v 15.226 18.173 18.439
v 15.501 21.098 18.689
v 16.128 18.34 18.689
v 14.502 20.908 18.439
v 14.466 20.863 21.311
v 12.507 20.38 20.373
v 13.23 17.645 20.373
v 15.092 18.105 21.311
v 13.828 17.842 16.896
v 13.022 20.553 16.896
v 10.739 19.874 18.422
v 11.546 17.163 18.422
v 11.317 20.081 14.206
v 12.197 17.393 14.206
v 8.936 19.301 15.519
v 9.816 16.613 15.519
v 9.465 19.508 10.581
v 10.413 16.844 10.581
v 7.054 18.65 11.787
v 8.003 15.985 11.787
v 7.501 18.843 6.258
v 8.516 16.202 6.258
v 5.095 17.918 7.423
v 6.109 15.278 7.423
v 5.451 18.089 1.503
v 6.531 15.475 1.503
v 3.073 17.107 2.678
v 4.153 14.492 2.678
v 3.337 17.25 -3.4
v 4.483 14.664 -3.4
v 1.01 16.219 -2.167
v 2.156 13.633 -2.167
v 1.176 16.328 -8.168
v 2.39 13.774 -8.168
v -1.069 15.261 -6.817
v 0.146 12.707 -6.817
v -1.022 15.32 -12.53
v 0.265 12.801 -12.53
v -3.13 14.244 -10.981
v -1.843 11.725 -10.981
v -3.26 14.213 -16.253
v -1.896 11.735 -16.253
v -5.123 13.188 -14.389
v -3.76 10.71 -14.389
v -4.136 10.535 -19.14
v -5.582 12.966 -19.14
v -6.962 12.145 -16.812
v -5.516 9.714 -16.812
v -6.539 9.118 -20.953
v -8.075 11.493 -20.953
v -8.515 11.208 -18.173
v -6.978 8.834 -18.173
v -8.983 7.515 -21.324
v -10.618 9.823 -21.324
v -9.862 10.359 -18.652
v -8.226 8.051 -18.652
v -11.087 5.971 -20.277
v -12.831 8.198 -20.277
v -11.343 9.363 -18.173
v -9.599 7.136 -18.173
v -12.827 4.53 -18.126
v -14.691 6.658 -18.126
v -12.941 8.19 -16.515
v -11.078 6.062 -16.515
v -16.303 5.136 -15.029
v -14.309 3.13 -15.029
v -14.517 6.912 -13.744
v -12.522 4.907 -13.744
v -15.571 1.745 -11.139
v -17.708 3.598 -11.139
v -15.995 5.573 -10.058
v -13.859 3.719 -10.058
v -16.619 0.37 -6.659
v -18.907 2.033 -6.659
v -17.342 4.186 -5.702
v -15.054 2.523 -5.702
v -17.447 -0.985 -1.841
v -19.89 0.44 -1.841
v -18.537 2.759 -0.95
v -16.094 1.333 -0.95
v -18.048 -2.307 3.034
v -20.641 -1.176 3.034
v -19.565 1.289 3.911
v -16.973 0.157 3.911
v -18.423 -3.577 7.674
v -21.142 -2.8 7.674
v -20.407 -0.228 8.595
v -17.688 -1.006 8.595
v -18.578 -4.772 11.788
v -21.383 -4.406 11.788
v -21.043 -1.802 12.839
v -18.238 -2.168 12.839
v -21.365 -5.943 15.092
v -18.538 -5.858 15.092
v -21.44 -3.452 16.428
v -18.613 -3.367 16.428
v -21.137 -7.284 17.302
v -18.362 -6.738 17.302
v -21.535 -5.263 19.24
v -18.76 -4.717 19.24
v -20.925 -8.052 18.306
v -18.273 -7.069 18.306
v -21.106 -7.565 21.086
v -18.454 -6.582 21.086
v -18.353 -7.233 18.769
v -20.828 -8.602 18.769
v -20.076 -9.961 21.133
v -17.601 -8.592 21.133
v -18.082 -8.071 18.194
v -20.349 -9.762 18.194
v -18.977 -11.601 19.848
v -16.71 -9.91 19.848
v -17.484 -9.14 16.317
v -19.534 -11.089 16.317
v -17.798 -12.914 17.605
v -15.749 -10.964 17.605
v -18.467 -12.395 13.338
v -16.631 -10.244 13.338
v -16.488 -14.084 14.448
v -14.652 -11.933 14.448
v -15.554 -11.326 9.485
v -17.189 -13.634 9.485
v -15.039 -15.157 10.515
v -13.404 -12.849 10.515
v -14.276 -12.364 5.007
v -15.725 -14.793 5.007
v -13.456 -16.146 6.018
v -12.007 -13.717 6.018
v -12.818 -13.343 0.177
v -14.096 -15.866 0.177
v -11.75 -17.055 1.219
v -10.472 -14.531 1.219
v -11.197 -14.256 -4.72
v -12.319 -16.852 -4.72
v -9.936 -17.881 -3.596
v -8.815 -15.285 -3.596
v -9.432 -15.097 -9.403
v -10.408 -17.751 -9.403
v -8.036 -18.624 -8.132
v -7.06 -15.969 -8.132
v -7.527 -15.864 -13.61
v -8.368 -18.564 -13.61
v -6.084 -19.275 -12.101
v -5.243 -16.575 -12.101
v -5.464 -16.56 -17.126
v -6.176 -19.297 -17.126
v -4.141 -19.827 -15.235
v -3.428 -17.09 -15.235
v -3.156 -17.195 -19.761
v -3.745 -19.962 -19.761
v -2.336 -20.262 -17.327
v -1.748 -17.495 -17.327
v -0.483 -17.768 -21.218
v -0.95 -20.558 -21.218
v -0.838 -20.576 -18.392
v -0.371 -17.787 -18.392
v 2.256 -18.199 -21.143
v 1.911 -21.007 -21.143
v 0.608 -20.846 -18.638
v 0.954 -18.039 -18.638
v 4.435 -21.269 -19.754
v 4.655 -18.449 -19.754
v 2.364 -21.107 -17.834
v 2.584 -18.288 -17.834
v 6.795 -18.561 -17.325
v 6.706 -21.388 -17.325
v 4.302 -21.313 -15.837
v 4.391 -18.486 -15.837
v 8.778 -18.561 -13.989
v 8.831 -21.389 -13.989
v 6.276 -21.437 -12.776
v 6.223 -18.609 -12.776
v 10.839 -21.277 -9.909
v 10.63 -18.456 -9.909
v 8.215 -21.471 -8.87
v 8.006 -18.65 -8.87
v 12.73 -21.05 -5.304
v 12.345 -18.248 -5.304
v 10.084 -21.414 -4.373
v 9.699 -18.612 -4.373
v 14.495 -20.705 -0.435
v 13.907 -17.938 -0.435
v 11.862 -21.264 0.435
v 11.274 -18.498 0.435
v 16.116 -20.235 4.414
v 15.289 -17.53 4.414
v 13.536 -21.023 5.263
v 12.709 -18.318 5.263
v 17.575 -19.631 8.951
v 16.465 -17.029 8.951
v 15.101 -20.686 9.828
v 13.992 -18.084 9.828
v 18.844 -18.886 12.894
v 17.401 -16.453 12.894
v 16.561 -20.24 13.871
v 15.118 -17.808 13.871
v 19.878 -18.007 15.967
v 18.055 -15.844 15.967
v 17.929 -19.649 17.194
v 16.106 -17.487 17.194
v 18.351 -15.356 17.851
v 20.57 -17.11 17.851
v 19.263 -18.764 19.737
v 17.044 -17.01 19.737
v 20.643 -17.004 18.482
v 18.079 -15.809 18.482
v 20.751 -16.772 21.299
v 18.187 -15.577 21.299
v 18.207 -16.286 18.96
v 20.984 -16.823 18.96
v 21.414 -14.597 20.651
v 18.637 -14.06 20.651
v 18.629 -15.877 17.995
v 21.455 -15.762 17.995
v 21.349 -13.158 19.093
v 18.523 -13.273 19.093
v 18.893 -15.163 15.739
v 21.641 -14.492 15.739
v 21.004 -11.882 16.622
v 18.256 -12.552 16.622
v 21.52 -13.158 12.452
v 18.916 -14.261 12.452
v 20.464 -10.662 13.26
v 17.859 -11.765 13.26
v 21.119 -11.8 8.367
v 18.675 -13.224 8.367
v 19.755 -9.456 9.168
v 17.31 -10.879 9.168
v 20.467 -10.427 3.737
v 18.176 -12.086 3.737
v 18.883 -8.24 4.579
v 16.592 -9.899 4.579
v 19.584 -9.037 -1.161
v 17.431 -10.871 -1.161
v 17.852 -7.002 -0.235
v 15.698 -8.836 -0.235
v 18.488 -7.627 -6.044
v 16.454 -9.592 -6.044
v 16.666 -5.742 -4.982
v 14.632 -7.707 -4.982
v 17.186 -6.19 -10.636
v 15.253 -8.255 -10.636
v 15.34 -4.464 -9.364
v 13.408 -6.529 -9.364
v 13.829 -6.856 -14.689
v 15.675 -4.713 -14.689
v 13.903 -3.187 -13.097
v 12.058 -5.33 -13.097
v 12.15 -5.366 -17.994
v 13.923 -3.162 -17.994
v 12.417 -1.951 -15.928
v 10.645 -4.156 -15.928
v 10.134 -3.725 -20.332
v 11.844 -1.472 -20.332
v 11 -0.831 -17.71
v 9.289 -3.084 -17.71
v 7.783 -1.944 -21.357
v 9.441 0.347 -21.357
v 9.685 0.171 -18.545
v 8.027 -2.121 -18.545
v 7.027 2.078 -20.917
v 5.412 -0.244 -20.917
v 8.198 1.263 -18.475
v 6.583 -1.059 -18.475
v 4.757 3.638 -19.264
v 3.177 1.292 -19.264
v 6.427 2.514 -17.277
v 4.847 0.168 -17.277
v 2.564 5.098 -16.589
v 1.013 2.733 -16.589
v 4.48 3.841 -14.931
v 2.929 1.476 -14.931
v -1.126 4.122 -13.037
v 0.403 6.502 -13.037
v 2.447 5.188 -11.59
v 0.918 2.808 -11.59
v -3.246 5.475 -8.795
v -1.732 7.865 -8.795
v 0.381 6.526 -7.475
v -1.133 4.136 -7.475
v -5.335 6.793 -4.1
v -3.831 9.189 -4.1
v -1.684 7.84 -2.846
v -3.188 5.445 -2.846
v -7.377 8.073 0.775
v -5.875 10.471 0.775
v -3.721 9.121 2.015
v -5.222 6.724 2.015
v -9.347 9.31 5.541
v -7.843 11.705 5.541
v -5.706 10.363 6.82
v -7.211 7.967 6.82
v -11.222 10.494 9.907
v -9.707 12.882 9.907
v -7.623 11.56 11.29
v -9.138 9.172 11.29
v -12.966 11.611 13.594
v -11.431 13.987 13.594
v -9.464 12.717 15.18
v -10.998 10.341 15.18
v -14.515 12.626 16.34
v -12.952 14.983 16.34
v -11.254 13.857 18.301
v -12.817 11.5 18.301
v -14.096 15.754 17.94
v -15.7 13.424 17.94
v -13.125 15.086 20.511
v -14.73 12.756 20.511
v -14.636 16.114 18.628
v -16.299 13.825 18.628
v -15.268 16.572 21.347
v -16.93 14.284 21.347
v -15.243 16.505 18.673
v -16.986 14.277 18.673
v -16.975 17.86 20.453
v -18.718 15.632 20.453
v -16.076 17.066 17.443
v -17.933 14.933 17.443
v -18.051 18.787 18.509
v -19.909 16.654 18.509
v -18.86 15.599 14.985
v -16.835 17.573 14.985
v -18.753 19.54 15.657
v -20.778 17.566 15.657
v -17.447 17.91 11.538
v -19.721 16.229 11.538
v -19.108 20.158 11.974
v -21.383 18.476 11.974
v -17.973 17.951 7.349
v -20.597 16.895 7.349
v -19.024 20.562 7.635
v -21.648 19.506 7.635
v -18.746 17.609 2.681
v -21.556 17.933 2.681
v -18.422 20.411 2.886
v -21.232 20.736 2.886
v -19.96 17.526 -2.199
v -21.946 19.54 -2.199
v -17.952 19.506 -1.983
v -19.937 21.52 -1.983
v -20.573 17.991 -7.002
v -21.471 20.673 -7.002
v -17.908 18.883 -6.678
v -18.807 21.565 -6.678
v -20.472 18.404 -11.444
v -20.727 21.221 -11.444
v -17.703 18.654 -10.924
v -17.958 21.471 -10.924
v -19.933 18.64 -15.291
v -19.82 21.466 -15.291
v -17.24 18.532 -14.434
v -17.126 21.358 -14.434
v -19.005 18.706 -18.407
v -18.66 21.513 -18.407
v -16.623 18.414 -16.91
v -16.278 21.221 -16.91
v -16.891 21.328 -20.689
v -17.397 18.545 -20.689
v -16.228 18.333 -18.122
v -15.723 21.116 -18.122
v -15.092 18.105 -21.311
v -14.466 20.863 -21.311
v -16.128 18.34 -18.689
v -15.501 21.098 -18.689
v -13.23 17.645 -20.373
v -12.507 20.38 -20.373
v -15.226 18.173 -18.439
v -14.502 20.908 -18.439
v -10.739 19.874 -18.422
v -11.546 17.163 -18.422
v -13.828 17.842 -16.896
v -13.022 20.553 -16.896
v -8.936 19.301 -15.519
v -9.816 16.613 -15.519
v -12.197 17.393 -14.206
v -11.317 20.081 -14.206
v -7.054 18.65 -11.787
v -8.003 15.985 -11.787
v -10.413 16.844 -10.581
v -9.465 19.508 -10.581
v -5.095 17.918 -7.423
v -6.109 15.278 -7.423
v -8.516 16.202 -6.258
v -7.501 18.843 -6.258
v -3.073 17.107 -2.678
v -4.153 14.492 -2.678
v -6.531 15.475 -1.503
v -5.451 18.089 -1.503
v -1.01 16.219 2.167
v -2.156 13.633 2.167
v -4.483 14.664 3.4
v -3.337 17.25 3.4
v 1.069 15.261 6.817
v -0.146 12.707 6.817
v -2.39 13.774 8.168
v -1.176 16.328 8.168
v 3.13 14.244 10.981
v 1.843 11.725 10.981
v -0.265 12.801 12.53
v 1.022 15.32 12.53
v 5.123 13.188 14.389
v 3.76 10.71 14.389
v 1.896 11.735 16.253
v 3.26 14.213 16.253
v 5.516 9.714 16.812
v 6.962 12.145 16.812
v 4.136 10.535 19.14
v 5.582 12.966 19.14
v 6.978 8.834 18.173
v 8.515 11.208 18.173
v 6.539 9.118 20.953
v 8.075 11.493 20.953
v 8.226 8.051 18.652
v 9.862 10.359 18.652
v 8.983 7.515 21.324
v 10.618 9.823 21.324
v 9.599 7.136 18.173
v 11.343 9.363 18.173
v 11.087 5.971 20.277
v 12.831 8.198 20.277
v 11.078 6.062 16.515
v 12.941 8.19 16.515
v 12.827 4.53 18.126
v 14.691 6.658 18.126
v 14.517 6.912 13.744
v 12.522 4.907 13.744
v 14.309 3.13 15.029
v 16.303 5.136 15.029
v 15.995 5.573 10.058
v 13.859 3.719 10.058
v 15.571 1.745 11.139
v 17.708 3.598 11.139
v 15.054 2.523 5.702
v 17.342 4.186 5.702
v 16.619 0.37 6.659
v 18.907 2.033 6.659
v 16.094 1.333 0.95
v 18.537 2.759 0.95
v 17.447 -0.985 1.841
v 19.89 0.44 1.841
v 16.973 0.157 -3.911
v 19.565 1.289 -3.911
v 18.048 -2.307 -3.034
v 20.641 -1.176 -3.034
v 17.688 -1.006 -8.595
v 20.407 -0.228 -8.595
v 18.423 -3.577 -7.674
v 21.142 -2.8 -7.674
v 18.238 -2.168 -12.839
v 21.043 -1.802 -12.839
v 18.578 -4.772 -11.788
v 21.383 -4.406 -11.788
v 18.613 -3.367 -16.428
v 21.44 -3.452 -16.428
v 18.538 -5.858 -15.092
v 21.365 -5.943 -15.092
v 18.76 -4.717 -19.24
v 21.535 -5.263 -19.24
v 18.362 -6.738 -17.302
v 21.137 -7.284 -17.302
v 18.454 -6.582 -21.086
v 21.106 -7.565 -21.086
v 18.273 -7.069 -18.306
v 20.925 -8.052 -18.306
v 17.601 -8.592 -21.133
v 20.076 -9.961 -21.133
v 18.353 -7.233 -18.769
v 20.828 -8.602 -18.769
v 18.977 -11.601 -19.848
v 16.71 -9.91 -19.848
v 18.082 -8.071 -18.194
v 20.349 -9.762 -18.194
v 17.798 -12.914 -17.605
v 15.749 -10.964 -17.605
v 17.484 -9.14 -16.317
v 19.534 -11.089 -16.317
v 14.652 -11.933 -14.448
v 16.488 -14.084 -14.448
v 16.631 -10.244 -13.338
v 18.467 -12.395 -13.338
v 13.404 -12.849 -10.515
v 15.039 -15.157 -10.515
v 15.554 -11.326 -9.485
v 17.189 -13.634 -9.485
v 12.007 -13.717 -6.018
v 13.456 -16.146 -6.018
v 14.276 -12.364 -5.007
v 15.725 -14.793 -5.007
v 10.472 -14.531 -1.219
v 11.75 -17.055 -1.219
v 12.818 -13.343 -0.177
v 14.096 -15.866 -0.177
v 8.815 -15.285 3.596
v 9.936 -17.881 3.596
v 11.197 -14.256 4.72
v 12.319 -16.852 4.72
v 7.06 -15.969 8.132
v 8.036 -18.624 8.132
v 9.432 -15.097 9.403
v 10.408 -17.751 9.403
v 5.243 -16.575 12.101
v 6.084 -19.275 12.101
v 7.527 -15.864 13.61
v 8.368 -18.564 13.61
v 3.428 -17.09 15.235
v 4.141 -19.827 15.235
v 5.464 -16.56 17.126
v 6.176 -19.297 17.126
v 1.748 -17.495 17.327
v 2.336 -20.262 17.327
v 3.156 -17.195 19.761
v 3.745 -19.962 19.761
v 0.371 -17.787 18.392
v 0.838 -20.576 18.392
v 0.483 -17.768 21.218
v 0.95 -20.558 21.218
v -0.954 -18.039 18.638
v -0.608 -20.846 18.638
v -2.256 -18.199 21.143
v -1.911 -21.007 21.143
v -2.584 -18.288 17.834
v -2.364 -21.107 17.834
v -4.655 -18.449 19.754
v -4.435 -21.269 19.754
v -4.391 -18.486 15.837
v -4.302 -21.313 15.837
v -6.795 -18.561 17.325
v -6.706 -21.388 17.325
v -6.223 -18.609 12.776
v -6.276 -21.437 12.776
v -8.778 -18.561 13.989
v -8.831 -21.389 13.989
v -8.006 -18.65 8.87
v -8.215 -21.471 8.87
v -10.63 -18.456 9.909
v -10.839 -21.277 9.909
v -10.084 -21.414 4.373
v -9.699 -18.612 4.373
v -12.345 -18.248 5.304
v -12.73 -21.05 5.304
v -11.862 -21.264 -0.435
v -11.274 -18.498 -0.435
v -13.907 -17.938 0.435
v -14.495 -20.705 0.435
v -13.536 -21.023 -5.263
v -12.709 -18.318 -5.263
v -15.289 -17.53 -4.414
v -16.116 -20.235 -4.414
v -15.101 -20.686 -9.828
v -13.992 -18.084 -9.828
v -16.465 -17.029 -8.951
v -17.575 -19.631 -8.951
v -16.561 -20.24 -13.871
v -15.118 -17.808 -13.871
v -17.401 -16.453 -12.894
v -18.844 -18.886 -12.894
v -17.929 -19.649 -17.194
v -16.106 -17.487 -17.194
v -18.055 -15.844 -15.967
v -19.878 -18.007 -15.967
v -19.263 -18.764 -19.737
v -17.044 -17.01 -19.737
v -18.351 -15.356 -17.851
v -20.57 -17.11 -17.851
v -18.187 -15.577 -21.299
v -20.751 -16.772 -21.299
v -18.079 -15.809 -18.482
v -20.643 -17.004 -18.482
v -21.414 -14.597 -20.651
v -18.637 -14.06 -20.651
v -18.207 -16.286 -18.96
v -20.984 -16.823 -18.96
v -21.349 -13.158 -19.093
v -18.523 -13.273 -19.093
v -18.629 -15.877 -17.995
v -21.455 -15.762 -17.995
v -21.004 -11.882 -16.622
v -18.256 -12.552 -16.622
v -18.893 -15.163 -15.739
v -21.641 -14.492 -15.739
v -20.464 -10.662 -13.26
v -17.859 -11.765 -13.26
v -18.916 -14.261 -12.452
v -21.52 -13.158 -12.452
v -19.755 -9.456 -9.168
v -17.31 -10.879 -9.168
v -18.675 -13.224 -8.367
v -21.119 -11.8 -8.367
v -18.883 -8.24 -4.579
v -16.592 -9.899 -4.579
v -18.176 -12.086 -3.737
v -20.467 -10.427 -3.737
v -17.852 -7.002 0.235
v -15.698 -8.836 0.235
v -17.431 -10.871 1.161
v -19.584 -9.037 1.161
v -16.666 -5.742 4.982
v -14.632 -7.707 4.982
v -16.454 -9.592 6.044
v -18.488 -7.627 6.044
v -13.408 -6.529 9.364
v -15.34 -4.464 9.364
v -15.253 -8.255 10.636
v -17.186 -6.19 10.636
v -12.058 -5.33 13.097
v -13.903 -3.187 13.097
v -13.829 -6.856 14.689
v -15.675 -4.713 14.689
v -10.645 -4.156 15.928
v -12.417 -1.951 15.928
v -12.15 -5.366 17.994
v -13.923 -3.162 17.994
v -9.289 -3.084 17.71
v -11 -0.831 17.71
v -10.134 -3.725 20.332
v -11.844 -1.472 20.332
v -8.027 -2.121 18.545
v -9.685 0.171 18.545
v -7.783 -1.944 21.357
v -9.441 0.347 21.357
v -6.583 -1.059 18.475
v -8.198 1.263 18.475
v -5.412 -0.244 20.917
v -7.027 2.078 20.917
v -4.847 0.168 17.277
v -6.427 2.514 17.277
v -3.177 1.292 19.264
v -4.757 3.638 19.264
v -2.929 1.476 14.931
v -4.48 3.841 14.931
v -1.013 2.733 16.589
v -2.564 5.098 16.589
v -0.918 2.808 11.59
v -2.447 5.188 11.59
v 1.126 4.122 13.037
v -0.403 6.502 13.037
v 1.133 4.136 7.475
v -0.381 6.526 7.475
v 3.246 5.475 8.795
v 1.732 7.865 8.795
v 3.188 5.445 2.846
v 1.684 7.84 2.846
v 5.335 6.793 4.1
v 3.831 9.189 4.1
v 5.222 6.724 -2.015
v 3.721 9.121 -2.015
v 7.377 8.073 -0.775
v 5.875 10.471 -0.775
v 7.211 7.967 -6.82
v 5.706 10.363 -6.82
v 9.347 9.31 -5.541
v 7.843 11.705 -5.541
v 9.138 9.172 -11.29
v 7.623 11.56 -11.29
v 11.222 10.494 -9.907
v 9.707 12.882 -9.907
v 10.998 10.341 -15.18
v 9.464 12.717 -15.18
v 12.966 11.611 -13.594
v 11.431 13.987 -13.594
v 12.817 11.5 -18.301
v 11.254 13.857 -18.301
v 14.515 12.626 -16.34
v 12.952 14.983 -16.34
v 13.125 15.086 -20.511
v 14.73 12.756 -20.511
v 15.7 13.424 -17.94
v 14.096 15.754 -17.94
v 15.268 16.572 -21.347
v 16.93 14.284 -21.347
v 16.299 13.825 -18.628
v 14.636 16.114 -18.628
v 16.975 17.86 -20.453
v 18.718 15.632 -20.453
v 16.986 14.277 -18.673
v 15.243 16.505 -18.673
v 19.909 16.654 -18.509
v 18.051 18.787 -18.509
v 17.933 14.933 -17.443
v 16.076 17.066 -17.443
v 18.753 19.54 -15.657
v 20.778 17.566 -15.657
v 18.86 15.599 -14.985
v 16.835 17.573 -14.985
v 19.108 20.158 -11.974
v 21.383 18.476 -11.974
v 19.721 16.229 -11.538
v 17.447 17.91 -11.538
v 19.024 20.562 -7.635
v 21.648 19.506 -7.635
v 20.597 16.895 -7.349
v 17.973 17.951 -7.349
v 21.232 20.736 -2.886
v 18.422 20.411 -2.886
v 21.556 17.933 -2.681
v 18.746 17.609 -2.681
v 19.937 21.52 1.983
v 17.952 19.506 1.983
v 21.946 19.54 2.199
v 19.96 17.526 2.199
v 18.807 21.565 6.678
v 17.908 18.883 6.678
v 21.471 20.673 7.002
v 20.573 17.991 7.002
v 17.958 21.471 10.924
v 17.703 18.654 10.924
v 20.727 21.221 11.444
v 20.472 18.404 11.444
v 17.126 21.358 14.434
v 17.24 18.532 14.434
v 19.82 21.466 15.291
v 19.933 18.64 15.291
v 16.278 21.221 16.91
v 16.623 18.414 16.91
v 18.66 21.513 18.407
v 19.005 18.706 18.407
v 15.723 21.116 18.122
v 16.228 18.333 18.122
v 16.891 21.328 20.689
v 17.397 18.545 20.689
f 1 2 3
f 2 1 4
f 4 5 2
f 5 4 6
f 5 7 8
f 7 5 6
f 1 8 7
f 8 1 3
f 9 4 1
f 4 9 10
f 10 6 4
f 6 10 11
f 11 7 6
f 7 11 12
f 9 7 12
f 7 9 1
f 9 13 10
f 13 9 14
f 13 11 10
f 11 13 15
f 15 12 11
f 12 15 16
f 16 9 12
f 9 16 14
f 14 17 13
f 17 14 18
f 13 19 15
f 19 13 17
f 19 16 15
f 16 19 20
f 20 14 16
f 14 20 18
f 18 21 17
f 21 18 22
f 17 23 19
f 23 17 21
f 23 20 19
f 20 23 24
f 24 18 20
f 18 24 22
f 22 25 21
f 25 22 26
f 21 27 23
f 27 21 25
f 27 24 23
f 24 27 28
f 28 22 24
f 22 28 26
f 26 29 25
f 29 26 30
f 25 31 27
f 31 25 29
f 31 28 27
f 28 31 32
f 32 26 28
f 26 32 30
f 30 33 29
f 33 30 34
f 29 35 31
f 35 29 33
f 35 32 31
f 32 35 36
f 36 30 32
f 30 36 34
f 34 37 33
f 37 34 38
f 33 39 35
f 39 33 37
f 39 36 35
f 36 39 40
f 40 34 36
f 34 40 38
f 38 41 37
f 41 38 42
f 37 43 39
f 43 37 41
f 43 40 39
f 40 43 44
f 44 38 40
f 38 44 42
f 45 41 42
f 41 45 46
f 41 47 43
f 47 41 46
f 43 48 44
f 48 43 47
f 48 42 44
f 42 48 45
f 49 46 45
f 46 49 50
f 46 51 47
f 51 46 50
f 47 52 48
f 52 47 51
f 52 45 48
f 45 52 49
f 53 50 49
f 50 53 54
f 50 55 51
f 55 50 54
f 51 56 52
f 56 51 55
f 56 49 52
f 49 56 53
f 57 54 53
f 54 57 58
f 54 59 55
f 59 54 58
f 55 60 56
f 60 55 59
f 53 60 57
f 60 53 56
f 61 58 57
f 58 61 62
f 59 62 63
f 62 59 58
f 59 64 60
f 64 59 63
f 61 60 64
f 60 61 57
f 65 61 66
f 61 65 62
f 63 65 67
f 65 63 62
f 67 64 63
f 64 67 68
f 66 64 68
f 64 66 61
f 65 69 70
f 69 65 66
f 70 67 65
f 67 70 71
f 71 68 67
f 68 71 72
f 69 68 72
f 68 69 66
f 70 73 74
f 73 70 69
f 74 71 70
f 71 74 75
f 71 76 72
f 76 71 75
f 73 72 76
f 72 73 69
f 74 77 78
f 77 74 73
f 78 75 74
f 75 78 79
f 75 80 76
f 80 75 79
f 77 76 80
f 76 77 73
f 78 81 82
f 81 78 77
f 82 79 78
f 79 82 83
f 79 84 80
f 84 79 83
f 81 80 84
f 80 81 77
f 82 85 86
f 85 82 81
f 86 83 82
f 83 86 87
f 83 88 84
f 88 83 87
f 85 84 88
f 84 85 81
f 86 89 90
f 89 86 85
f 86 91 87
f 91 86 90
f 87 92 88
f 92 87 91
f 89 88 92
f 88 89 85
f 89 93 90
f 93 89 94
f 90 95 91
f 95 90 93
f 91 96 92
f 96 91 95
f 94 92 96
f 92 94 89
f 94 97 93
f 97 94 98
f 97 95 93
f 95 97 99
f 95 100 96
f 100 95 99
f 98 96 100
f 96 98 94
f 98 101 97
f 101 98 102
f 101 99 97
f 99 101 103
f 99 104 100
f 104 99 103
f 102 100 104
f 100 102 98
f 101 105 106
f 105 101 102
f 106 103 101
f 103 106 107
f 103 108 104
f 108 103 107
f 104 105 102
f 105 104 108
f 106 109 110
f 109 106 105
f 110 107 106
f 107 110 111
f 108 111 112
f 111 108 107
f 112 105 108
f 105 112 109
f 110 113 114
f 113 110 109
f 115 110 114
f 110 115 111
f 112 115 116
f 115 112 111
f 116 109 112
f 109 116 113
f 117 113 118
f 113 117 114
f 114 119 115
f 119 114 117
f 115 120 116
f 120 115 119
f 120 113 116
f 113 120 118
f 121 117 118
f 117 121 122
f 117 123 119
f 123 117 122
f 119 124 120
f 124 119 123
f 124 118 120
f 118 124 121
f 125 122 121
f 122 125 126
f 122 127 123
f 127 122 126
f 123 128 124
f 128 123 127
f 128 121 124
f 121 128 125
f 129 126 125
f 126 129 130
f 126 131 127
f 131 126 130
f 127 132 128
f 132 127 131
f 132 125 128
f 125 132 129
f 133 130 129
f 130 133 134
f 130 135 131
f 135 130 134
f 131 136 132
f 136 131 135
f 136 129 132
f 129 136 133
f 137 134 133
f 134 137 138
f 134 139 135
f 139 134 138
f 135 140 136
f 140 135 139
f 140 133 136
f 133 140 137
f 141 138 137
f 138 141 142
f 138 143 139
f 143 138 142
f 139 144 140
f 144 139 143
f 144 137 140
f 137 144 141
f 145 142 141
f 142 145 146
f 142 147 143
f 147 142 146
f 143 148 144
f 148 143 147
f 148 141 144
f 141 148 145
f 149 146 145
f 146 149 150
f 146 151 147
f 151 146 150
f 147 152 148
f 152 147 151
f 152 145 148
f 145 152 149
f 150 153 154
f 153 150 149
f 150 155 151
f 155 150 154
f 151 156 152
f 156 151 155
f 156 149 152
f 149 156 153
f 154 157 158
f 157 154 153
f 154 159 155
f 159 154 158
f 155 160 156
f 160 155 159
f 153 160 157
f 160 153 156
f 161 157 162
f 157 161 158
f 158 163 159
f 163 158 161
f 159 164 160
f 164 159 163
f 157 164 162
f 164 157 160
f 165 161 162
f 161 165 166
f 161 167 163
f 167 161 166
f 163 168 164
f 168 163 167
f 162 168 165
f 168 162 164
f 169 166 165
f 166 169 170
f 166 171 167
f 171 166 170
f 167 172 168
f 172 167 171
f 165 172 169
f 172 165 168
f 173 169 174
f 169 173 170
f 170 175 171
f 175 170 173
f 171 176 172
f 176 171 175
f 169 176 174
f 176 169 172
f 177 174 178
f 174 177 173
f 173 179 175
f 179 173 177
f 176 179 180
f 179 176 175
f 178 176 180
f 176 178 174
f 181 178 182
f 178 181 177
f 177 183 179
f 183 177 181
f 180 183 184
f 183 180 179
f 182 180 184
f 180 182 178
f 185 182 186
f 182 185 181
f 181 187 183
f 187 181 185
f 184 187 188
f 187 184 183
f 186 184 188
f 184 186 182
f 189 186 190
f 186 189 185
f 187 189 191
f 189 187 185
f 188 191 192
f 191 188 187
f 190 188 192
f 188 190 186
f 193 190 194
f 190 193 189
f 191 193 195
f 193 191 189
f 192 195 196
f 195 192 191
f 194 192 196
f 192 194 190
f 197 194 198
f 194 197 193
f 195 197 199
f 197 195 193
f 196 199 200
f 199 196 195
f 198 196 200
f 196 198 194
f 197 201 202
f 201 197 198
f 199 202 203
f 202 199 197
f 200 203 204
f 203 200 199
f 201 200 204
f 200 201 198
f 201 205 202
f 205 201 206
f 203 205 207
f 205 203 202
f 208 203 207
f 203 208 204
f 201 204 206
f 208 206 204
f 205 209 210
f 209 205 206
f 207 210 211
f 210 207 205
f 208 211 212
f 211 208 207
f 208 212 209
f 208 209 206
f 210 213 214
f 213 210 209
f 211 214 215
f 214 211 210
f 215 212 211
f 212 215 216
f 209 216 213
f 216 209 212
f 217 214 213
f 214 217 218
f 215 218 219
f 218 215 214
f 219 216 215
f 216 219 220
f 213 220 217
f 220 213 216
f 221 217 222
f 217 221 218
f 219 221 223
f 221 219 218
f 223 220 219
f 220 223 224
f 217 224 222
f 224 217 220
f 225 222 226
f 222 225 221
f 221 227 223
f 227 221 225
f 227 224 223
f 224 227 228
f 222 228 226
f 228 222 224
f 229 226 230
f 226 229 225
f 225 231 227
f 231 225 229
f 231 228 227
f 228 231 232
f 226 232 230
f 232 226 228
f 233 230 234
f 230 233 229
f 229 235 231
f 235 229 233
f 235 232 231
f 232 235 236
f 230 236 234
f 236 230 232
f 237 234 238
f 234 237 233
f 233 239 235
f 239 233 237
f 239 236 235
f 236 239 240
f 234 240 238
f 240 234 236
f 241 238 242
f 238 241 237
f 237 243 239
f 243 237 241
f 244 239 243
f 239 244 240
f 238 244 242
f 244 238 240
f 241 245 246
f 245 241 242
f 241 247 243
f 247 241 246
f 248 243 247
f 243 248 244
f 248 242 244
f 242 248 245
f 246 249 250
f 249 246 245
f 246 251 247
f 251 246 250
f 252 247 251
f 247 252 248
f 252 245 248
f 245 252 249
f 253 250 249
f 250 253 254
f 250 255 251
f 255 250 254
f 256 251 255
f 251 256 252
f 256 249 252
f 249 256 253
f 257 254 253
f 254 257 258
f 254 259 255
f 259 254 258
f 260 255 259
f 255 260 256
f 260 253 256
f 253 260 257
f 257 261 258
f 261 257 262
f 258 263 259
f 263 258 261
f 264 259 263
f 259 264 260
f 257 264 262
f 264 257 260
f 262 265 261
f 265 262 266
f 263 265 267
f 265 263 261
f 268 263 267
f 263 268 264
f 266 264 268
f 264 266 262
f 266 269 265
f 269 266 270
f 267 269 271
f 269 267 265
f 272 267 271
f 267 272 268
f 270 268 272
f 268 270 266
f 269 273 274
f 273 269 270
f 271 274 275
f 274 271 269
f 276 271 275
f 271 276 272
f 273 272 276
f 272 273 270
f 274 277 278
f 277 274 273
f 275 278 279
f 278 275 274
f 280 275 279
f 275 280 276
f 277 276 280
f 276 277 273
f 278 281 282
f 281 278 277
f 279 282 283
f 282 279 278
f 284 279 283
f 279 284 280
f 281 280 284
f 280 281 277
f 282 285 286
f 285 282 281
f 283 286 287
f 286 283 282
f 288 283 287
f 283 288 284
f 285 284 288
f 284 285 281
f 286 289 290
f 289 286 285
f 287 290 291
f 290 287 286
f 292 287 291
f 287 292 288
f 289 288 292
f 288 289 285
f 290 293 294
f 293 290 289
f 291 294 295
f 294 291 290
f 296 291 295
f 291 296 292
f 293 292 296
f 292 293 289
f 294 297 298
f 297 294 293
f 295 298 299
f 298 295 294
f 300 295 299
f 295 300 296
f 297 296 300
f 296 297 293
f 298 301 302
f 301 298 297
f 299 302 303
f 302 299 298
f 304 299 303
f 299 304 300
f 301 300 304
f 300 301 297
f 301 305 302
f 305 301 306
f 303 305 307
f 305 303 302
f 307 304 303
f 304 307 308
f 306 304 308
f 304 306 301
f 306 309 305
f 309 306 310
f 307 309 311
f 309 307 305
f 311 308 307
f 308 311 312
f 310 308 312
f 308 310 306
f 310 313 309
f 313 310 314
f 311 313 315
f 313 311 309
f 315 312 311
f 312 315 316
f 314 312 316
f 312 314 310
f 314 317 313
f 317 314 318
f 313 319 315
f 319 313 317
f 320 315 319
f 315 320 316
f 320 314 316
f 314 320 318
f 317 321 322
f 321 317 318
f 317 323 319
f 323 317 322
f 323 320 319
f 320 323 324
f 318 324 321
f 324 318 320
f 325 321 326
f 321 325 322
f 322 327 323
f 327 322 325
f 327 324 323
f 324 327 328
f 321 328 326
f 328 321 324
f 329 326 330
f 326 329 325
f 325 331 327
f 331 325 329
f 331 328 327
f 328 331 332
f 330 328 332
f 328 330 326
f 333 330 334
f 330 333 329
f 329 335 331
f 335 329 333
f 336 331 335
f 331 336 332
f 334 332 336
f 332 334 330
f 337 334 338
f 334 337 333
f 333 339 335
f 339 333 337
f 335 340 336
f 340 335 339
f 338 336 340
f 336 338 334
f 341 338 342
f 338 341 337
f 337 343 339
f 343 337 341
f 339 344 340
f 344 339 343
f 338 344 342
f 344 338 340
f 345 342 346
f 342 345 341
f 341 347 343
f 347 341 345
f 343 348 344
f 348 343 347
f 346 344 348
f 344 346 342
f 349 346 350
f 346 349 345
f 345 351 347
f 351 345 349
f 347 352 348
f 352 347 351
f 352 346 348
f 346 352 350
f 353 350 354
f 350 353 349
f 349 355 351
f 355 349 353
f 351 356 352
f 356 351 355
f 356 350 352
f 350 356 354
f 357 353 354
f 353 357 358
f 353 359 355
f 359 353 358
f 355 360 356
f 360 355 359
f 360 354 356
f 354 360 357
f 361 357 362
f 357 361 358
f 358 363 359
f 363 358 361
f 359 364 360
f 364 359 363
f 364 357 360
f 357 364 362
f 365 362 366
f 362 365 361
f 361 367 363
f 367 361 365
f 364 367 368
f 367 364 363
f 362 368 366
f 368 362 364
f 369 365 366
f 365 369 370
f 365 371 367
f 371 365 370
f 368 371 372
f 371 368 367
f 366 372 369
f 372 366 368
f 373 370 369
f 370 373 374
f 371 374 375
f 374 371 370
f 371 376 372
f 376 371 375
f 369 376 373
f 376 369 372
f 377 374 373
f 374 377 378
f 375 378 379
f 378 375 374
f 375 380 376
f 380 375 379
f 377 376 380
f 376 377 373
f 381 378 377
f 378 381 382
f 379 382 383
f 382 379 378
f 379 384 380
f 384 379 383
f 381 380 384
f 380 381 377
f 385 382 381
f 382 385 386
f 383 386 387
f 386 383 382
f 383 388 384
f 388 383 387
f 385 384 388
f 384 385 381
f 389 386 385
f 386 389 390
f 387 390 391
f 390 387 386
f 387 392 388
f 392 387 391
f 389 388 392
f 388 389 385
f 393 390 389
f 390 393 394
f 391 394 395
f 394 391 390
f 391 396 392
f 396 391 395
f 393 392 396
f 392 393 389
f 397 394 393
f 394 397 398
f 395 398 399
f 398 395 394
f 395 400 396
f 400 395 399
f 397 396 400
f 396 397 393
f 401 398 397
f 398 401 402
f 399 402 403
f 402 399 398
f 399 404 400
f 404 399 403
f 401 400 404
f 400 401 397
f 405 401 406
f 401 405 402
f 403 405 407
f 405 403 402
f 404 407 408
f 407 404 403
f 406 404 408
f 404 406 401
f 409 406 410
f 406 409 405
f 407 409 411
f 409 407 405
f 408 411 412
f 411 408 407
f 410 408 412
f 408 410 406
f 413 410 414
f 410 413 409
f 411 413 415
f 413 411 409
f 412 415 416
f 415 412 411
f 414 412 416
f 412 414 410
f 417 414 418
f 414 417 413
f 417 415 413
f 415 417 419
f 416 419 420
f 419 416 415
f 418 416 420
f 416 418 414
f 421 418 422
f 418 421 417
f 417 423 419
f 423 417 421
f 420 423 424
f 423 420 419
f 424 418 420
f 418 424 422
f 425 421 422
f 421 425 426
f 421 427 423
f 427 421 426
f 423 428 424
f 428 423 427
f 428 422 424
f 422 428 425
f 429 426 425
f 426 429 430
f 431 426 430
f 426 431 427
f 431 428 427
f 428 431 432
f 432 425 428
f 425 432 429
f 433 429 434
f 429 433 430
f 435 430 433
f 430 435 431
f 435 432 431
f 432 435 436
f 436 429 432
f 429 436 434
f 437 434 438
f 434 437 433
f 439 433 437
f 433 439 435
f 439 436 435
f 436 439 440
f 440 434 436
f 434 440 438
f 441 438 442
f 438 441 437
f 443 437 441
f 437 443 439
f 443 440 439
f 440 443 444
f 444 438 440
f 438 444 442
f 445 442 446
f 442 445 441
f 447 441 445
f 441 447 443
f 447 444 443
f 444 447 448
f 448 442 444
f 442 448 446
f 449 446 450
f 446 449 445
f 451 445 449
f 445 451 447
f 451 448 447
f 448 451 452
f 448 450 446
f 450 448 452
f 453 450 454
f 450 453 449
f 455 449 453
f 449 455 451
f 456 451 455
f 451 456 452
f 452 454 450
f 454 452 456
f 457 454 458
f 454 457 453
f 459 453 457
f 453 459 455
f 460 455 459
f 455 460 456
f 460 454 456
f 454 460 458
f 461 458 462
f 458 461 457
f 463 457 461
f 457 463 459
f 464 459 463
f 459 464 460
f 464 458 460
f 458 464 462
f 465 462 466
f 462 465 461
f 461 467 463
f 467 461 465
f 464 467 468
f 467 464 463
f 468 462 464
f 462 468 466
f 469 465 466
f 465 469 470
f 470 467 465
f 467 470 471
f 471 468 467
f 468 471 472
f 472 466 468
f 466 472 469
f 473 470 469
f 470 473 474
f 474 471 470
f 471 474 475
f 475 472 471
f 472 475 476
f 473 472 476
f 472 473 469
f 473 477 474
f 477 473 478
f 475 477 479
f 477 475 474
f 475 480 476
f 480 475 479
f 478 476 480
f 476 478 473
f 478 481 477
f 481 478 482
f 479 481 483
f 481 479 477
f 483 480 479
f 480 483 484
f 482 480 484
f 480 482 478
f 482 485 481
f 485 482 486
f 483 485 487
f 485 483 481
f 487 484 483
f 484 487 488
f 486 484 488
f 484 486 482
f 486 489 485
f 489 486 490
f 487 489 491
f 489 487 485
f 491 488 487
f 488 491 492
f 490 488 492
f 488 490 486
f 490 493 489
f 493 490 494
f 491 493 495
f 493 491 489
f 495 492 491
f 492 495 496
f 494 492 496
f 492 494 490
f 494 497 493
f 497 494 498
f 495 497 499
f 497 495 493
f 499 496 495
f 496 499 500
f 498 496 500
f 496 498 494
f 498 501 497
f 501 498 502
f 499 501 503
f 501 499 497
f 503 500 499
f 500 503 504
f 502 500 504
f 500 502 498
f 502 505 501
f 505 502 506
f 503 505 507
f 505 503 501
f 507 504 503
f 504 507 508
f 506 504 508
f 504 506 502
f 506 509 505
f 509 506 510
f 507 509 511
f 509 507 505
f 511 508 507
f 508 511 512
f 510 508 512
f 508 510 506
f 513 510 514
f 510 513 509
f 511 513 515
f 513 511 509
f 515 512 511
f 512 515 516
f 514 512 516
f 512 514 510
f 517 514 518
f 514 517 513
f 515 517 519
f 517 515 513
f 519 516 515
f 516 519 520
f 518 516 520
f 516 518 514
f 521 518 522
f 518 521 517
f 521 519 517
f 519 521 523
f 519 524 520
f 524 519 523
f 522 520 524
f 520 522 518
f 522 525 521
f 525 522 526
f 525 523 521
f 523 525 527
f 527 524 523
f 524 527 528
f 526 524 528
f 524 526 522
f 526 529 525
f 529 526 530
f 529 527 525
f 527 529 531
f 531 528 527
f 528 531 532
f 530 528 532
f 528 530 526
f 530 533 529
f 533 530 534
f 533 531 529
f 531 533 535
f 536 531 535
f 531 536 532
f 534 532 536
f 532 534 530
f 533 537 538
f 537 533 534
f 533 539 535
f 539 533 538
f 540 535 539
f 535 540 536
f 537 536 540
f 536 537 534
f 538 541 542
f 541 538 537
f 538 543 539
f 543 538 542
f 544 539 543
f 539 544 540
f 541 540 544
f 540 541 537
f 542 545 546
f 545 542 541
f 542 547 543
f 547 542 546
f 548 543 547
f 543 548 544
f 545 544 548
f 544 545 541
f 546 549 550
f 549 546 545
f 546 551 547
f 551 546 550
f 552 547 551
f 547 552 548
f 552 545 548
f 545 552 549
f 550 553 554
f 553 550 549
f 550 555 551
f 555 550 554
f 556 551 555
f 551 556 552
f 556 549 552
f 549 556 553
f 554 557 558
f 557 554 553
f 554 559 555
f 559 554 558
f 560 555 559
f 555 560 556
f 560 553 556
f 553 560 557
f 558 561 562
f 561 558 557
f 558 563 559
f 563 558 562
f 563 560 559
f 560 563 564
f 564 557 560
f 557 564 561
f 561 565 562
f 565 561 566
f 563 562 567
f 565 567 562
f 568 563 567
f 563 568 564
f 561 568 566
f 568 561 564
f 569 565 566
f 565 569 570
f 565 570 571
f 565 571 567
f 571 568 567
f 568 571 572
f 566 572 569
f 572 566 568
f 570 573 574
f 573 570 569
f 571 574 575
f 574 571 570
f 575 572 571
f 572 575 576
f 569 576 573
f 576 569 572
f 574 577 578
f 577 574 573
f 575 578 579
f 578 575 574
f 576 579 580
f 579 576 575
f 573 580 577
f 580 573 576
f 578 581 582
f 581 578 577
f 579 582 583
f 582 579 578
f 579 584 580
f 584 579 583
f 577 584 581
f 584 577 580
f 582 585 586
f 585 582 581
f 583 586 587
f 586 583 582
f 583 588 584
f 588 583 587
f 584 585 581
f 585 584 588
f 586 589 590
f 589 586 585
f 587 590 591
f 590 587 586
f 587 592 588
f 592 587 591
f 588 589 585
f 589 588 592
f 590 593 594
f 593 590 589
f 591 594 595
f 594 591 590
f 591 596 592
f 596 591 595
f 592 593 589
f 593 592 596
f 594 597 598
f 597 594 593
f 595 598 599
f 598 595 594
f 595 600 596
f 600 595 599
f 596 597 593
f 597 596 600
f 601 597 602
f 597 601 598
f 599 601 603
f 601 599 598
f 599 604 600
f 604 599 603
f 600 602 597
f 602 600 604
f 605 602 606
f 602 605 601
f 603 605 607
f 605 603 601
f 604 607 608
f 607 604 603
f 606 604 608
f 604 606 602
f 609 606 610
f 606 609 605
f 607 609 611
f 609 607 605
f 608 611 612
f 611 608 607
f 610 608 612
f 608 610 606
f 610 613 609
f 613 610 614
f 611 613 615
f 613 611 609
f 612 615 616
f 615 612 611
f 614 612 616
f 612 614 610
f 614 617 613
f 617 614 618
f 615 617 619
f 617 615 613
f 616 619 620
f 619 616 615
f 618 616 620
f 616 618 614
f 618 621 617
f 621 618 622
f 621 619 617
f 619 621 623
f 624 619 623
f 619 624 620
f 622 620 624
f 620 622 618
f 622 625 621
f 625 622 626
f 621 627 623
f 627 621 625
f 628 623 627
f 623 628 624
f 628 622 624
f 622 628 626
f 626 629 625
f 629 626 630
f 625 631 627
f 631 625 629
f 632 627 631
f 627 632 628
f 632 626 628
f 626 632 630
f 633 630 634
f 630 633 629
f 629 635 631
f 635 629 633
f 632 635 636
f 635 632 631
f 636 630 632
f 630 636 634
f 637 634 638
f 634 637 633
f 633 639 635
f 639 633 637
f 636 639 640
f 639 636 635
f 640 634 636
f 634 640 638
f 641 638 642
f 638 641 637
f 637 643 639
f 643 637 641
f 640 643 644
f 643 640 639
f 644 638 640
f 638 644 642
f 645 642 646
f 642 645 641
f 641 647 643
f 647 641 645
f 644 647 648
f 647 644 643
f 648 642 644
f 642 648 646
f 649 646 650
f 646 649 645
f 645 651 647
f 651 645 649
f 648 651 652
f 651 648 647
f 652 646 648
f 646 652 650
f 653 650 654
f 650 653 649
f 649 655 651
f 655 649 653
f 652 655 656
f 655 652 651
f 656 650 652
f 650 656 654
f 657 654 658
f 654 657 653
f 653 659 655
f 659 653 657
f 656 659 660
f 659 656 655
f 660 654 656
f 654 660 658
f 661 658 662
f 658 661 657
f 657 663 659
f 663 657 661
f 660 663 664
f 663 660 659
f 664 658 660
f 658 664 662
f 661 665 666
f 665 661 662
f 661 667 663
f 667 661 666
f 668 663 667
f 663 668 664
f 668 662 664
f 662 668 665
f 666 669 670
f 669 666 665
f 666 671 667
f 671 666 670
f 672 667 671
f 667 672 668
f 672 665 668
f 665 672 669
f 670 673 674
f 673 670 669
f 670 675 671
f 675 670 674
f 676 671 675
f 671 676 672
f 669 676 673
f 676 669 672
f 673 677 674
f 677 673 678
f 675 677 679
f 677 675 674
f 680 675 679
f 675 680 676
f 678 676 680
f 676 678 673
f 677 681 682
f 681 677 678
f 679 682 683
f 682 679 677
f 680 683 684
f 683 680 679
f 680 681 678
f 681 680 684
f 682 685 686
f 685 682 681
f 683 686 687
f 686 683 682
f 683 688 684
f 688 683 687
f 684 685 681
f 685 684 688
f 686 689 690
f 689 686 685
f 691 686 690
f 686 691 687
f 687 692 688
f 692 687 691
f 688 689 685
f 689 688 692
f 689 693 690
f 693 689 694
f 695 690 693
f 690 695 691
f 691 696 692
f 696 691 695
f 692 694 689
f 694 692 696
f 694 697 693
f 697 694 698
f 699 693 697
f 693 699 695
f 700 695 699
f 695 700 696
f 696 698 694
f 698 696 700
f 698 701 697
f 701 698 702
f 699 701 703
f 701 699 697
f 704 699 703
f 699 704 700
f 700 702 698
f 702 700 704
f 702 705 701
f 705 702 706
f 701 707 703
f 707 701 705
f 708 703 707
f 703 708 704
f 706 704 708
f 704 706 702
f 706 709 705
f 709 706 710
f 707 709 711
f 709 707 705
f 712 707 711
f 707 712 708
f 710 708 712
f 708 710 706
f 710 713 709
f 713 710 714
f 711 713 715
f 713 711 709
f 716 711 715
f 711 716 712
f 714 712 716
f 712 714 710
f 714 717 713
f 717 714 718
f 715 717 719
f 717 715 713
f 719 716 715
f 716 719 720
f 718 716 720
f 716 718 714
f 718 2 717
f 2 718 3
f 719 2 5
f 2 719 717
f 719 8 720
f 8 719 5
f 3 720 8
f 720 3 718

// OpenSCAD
/*
    remix of "Celtic knots as Lissajous knots"
    by Kit Wallace
    https://www.thingiverse.com/thing:2257185

    Lissajous Knot:
    https://en.wikipedia.org/wiki/Lissajous_knot
*/

Scale=20; // [1.0:0.5:60]
// Sides of rope - must be a divisor of 360
Sides=4; // [3,4,5,6,8,9,10,12,15,30,45,60]
// decrease for finer details
Step = 2; // [0.2:0.2:5]
// x scaling
vx = 1.0; // [0.0:0.1:4]
// y scaling
vy = 1.0; // [0.0:0.1:4]
// z scaling
vz = 1.0; // [0.0:0.1:4]
// Rope diameter
Rope_Diameter=2.0; // [0.5:0.1:6.0]
// true if knot is open or partial
Open = false; // [false,true]
// change for partial path 
Start=0; // [0:360]
// change for partial path
End=360; // [0:360]

// x_angle_multiple
nx = 3.0; // [0.5:0.5:30]
// y_angle_multiple
ny = 2.0; // [0.5:0.5:30]
// z_angle_multiple
nz = 7.0; // [0.5:0.5:30]
// (radians)
px_RAD = 0.7; // [0.0:0.1:4.0]
// (radians)
py_RAD = 0.2; // [0.0:0.1:4.0]
// (radians)
pz_RAD = 0.0; // [0.0:0.1:4.0]
// phase angle for profile (matters for low Sides)
Phase = 45; // [0:5:180]

/* [Hidden] */


// create a tube as a polyhedron 
// tube can be open or closed

// polyhedron constructor

function poly(name,vertices,faces,debug=[],partial=false) = 
    [name,vertices,faces,debug,partial];

function p_name(obj) = obj[0];
function p_vertices(obj) = obj[1];
function p_faces(obj) = obj[2];
  
module show_solid(obj) {
    polyhedron(p_vertices(obj),p_faces(obj),convexity=10);
};

// utility functions  
function m_translate(v) = [ [1, 0, 0, 0],
                            [0, 1, 0, 0],
                            [0, 0, 1, 0],
                            [v.x, v.y, v.z, 1  ] ];
                            
function m_rotate(v) =  [ [1,  0,         0,        0],
                          [0,  cos(v.x),  sin(v.x), 0],
                          [0, -sin(v.x),  cos(v.x), 0],
                          [0,  0,         0,        1] ]
                      * [ [ cos(v.y), 0,  -sin(v.y), 0],
                          [0,         1,  0,        0],
                          [ sin(v.y), 0,  cos(v.y), 0],
                          [0,         0,  0,        1] ]
                      * [ [ cos(v.z),  sin(v.z), 0, 0],
                          [-sin(v.z),  cos(v.z), 0, 0],
                          [ 0,         0,        1, 0],
                          [ 0,         0,        0, 1] ];
                            
function vec3(v) = [v.x, v.y, v.z];
function transform(v, m)  = vec3([v.x, v.y, v.z, 1] * m);
                            
function orient_to(centre,normal, p) = m_rotate([0, atan2(sqrt(pow(normal.x, 2) + pow(normal.y, 2)), normal.z), 0]) 
                     * m_rotate([0, 0, atan2(normal[1], normal[0])]) 
                     * m_translate(centre);

// solid from path


function circle_points(r, sides,phase=45) = 
    let (delta = 360/sides)
    [for (i=[0:sides-1]) [r * sin(i*delta + phase), r *  cos(i*delta+phase), 0]];

function loop_points(step,min=0,max=360) = 
    [for (t=[min:step:max-step]) f(t)];

function transform_points(list, matrix, i = 0) = 
    i < len(list) 
       ? concat([ transform(list[i], matrix) ], transform_points(list, matrix, i + 1))
       : [];

function tube_points(loop, circle_points,  i = 0) = 
    (i < len(loop) - 1)
     ?  concat(transform_points(circle_points, orient_to(loop[i], loop[i + 1] - loop[i] )), 
               tube_points(loop, circle_points, i + 1)) 
     : transform_points(circle_points, orient_to(loop[i], loop[0] - loop[i] )) ;

function loop_faces(segs, sides, open=false) = 
   open 
     ?  concat(
         [[for (j=[sides - 1:-1:0]) j ]],
         [for (i=[0:segs-3]) 
          for (j=[0:sides -1])  
             [ i * sides + j, 
               i * sides + (j + 1) % sides, 
              (i + 1) * sides + (j + 1) % sides, 
              (i + 1) * sides + j
             ]
        ] ,   
        [[for (j=[0:1:sides - 1]) (segs-2)*sides  + j]]
        )
     : [for (i=[0:segs]) 
        for (j=[0:sides -1])  
         [ i * sides + j, 
          i * sides + (j + 1) % sides, 
          ((i + 1) % segs) * sides + (j + 1) % sides, 
          ((i + 1) % segs) * sides + j
         ]   
       ]  
     ;

//  path with hulls

module hulled_path(path,r) {
    for (i = [0 : 1 : len(path) - 1 ]) {
        hull() {
            translate(path[i]) sphere(r);
            translate(path[(i + 1) % len(path)]) sphere(r);
        }
    }
};

// smoothed path by interpolate between points 

weight = [-1, 9, 9, -1] / 16;

function interpolate(path,n,i) =
        path[(i + n - 1) %n] * weight[0] +
        path[i]             * weight[1] +
        path[(i + 1) %n]    * weight[2] +
        path[(i + 2) %n]    * weight[3] ;

function subdivide(path,i=0) = 
    i < len(path) 
     ? concat([path[i]], 
              [interpolate(path,len(path),i)],
              subdivide(path, i+1))
     : [];

function smooth(path,n) =
    n == 0
     ?  path
     :  smooth(subdivide(path),n-1);


function path_segment(path,start,end) =
    let (l = len(path))
    let (s = max(floor(start * 360 / l),0),
         e = min(ceil(end * 360 / l),l - 1))
    [for (i=[s:e]) path[i]];


function scale(path,scale,i=0) =
    i < len(path)
      ?  concat( 
           [[path[i][0]*scale[0],path[i][1]*scale[1],path[i][2]*scale[2]]], 
           scale(path,scale,i+1)
         )
      :  [];

function curve_length(step,t=0) =
    t < 360
      ?  norm(f(t+step) - f(t)) + curve_length(step,t+step)
      :  0;

function map(t, min, max) =
      min + t* (max-min)/360;
    
//  create a knot from a path 

function path_knot(path,r,sides,kscale,phase=45,open=false)  =
  let(loop_points = scale(path,kscale))
  let(circle_points = circle_points(r,sides,phase))
  let(tube_points = tube_points(loop_points,circle_points))
  let(loop_faces = loop_faces(len(loop_points),sides,open))
  poly(name="Knot",
         vertices = tube_points,
         faces = loop_faces);

 // render_type function-1
           
R=Rope_Diameter/Scale;
RAD=180/PI;
px=px_RAD * RAD;
py=py_RAD * RAD;
pz=pz_RAD * RAD;

function f(t) = 
    [  cos(nx * t + px) ,
       cos(ny * t + py),
       cos(nz * t + pz)
    ];
 
            
Kscale=[vx,vy,vz];
Paths = [loop_points(Step,Start,End)];
scale(Scale)
for (k =[0:len(Paths) - 1]) {
   path = Paths[k];
 knot= path_knot(path,R,Sides,Kscale,Phase,Open);
 
   solid1=knot;  // apply transformations here
      show_solid(solid1);
};
